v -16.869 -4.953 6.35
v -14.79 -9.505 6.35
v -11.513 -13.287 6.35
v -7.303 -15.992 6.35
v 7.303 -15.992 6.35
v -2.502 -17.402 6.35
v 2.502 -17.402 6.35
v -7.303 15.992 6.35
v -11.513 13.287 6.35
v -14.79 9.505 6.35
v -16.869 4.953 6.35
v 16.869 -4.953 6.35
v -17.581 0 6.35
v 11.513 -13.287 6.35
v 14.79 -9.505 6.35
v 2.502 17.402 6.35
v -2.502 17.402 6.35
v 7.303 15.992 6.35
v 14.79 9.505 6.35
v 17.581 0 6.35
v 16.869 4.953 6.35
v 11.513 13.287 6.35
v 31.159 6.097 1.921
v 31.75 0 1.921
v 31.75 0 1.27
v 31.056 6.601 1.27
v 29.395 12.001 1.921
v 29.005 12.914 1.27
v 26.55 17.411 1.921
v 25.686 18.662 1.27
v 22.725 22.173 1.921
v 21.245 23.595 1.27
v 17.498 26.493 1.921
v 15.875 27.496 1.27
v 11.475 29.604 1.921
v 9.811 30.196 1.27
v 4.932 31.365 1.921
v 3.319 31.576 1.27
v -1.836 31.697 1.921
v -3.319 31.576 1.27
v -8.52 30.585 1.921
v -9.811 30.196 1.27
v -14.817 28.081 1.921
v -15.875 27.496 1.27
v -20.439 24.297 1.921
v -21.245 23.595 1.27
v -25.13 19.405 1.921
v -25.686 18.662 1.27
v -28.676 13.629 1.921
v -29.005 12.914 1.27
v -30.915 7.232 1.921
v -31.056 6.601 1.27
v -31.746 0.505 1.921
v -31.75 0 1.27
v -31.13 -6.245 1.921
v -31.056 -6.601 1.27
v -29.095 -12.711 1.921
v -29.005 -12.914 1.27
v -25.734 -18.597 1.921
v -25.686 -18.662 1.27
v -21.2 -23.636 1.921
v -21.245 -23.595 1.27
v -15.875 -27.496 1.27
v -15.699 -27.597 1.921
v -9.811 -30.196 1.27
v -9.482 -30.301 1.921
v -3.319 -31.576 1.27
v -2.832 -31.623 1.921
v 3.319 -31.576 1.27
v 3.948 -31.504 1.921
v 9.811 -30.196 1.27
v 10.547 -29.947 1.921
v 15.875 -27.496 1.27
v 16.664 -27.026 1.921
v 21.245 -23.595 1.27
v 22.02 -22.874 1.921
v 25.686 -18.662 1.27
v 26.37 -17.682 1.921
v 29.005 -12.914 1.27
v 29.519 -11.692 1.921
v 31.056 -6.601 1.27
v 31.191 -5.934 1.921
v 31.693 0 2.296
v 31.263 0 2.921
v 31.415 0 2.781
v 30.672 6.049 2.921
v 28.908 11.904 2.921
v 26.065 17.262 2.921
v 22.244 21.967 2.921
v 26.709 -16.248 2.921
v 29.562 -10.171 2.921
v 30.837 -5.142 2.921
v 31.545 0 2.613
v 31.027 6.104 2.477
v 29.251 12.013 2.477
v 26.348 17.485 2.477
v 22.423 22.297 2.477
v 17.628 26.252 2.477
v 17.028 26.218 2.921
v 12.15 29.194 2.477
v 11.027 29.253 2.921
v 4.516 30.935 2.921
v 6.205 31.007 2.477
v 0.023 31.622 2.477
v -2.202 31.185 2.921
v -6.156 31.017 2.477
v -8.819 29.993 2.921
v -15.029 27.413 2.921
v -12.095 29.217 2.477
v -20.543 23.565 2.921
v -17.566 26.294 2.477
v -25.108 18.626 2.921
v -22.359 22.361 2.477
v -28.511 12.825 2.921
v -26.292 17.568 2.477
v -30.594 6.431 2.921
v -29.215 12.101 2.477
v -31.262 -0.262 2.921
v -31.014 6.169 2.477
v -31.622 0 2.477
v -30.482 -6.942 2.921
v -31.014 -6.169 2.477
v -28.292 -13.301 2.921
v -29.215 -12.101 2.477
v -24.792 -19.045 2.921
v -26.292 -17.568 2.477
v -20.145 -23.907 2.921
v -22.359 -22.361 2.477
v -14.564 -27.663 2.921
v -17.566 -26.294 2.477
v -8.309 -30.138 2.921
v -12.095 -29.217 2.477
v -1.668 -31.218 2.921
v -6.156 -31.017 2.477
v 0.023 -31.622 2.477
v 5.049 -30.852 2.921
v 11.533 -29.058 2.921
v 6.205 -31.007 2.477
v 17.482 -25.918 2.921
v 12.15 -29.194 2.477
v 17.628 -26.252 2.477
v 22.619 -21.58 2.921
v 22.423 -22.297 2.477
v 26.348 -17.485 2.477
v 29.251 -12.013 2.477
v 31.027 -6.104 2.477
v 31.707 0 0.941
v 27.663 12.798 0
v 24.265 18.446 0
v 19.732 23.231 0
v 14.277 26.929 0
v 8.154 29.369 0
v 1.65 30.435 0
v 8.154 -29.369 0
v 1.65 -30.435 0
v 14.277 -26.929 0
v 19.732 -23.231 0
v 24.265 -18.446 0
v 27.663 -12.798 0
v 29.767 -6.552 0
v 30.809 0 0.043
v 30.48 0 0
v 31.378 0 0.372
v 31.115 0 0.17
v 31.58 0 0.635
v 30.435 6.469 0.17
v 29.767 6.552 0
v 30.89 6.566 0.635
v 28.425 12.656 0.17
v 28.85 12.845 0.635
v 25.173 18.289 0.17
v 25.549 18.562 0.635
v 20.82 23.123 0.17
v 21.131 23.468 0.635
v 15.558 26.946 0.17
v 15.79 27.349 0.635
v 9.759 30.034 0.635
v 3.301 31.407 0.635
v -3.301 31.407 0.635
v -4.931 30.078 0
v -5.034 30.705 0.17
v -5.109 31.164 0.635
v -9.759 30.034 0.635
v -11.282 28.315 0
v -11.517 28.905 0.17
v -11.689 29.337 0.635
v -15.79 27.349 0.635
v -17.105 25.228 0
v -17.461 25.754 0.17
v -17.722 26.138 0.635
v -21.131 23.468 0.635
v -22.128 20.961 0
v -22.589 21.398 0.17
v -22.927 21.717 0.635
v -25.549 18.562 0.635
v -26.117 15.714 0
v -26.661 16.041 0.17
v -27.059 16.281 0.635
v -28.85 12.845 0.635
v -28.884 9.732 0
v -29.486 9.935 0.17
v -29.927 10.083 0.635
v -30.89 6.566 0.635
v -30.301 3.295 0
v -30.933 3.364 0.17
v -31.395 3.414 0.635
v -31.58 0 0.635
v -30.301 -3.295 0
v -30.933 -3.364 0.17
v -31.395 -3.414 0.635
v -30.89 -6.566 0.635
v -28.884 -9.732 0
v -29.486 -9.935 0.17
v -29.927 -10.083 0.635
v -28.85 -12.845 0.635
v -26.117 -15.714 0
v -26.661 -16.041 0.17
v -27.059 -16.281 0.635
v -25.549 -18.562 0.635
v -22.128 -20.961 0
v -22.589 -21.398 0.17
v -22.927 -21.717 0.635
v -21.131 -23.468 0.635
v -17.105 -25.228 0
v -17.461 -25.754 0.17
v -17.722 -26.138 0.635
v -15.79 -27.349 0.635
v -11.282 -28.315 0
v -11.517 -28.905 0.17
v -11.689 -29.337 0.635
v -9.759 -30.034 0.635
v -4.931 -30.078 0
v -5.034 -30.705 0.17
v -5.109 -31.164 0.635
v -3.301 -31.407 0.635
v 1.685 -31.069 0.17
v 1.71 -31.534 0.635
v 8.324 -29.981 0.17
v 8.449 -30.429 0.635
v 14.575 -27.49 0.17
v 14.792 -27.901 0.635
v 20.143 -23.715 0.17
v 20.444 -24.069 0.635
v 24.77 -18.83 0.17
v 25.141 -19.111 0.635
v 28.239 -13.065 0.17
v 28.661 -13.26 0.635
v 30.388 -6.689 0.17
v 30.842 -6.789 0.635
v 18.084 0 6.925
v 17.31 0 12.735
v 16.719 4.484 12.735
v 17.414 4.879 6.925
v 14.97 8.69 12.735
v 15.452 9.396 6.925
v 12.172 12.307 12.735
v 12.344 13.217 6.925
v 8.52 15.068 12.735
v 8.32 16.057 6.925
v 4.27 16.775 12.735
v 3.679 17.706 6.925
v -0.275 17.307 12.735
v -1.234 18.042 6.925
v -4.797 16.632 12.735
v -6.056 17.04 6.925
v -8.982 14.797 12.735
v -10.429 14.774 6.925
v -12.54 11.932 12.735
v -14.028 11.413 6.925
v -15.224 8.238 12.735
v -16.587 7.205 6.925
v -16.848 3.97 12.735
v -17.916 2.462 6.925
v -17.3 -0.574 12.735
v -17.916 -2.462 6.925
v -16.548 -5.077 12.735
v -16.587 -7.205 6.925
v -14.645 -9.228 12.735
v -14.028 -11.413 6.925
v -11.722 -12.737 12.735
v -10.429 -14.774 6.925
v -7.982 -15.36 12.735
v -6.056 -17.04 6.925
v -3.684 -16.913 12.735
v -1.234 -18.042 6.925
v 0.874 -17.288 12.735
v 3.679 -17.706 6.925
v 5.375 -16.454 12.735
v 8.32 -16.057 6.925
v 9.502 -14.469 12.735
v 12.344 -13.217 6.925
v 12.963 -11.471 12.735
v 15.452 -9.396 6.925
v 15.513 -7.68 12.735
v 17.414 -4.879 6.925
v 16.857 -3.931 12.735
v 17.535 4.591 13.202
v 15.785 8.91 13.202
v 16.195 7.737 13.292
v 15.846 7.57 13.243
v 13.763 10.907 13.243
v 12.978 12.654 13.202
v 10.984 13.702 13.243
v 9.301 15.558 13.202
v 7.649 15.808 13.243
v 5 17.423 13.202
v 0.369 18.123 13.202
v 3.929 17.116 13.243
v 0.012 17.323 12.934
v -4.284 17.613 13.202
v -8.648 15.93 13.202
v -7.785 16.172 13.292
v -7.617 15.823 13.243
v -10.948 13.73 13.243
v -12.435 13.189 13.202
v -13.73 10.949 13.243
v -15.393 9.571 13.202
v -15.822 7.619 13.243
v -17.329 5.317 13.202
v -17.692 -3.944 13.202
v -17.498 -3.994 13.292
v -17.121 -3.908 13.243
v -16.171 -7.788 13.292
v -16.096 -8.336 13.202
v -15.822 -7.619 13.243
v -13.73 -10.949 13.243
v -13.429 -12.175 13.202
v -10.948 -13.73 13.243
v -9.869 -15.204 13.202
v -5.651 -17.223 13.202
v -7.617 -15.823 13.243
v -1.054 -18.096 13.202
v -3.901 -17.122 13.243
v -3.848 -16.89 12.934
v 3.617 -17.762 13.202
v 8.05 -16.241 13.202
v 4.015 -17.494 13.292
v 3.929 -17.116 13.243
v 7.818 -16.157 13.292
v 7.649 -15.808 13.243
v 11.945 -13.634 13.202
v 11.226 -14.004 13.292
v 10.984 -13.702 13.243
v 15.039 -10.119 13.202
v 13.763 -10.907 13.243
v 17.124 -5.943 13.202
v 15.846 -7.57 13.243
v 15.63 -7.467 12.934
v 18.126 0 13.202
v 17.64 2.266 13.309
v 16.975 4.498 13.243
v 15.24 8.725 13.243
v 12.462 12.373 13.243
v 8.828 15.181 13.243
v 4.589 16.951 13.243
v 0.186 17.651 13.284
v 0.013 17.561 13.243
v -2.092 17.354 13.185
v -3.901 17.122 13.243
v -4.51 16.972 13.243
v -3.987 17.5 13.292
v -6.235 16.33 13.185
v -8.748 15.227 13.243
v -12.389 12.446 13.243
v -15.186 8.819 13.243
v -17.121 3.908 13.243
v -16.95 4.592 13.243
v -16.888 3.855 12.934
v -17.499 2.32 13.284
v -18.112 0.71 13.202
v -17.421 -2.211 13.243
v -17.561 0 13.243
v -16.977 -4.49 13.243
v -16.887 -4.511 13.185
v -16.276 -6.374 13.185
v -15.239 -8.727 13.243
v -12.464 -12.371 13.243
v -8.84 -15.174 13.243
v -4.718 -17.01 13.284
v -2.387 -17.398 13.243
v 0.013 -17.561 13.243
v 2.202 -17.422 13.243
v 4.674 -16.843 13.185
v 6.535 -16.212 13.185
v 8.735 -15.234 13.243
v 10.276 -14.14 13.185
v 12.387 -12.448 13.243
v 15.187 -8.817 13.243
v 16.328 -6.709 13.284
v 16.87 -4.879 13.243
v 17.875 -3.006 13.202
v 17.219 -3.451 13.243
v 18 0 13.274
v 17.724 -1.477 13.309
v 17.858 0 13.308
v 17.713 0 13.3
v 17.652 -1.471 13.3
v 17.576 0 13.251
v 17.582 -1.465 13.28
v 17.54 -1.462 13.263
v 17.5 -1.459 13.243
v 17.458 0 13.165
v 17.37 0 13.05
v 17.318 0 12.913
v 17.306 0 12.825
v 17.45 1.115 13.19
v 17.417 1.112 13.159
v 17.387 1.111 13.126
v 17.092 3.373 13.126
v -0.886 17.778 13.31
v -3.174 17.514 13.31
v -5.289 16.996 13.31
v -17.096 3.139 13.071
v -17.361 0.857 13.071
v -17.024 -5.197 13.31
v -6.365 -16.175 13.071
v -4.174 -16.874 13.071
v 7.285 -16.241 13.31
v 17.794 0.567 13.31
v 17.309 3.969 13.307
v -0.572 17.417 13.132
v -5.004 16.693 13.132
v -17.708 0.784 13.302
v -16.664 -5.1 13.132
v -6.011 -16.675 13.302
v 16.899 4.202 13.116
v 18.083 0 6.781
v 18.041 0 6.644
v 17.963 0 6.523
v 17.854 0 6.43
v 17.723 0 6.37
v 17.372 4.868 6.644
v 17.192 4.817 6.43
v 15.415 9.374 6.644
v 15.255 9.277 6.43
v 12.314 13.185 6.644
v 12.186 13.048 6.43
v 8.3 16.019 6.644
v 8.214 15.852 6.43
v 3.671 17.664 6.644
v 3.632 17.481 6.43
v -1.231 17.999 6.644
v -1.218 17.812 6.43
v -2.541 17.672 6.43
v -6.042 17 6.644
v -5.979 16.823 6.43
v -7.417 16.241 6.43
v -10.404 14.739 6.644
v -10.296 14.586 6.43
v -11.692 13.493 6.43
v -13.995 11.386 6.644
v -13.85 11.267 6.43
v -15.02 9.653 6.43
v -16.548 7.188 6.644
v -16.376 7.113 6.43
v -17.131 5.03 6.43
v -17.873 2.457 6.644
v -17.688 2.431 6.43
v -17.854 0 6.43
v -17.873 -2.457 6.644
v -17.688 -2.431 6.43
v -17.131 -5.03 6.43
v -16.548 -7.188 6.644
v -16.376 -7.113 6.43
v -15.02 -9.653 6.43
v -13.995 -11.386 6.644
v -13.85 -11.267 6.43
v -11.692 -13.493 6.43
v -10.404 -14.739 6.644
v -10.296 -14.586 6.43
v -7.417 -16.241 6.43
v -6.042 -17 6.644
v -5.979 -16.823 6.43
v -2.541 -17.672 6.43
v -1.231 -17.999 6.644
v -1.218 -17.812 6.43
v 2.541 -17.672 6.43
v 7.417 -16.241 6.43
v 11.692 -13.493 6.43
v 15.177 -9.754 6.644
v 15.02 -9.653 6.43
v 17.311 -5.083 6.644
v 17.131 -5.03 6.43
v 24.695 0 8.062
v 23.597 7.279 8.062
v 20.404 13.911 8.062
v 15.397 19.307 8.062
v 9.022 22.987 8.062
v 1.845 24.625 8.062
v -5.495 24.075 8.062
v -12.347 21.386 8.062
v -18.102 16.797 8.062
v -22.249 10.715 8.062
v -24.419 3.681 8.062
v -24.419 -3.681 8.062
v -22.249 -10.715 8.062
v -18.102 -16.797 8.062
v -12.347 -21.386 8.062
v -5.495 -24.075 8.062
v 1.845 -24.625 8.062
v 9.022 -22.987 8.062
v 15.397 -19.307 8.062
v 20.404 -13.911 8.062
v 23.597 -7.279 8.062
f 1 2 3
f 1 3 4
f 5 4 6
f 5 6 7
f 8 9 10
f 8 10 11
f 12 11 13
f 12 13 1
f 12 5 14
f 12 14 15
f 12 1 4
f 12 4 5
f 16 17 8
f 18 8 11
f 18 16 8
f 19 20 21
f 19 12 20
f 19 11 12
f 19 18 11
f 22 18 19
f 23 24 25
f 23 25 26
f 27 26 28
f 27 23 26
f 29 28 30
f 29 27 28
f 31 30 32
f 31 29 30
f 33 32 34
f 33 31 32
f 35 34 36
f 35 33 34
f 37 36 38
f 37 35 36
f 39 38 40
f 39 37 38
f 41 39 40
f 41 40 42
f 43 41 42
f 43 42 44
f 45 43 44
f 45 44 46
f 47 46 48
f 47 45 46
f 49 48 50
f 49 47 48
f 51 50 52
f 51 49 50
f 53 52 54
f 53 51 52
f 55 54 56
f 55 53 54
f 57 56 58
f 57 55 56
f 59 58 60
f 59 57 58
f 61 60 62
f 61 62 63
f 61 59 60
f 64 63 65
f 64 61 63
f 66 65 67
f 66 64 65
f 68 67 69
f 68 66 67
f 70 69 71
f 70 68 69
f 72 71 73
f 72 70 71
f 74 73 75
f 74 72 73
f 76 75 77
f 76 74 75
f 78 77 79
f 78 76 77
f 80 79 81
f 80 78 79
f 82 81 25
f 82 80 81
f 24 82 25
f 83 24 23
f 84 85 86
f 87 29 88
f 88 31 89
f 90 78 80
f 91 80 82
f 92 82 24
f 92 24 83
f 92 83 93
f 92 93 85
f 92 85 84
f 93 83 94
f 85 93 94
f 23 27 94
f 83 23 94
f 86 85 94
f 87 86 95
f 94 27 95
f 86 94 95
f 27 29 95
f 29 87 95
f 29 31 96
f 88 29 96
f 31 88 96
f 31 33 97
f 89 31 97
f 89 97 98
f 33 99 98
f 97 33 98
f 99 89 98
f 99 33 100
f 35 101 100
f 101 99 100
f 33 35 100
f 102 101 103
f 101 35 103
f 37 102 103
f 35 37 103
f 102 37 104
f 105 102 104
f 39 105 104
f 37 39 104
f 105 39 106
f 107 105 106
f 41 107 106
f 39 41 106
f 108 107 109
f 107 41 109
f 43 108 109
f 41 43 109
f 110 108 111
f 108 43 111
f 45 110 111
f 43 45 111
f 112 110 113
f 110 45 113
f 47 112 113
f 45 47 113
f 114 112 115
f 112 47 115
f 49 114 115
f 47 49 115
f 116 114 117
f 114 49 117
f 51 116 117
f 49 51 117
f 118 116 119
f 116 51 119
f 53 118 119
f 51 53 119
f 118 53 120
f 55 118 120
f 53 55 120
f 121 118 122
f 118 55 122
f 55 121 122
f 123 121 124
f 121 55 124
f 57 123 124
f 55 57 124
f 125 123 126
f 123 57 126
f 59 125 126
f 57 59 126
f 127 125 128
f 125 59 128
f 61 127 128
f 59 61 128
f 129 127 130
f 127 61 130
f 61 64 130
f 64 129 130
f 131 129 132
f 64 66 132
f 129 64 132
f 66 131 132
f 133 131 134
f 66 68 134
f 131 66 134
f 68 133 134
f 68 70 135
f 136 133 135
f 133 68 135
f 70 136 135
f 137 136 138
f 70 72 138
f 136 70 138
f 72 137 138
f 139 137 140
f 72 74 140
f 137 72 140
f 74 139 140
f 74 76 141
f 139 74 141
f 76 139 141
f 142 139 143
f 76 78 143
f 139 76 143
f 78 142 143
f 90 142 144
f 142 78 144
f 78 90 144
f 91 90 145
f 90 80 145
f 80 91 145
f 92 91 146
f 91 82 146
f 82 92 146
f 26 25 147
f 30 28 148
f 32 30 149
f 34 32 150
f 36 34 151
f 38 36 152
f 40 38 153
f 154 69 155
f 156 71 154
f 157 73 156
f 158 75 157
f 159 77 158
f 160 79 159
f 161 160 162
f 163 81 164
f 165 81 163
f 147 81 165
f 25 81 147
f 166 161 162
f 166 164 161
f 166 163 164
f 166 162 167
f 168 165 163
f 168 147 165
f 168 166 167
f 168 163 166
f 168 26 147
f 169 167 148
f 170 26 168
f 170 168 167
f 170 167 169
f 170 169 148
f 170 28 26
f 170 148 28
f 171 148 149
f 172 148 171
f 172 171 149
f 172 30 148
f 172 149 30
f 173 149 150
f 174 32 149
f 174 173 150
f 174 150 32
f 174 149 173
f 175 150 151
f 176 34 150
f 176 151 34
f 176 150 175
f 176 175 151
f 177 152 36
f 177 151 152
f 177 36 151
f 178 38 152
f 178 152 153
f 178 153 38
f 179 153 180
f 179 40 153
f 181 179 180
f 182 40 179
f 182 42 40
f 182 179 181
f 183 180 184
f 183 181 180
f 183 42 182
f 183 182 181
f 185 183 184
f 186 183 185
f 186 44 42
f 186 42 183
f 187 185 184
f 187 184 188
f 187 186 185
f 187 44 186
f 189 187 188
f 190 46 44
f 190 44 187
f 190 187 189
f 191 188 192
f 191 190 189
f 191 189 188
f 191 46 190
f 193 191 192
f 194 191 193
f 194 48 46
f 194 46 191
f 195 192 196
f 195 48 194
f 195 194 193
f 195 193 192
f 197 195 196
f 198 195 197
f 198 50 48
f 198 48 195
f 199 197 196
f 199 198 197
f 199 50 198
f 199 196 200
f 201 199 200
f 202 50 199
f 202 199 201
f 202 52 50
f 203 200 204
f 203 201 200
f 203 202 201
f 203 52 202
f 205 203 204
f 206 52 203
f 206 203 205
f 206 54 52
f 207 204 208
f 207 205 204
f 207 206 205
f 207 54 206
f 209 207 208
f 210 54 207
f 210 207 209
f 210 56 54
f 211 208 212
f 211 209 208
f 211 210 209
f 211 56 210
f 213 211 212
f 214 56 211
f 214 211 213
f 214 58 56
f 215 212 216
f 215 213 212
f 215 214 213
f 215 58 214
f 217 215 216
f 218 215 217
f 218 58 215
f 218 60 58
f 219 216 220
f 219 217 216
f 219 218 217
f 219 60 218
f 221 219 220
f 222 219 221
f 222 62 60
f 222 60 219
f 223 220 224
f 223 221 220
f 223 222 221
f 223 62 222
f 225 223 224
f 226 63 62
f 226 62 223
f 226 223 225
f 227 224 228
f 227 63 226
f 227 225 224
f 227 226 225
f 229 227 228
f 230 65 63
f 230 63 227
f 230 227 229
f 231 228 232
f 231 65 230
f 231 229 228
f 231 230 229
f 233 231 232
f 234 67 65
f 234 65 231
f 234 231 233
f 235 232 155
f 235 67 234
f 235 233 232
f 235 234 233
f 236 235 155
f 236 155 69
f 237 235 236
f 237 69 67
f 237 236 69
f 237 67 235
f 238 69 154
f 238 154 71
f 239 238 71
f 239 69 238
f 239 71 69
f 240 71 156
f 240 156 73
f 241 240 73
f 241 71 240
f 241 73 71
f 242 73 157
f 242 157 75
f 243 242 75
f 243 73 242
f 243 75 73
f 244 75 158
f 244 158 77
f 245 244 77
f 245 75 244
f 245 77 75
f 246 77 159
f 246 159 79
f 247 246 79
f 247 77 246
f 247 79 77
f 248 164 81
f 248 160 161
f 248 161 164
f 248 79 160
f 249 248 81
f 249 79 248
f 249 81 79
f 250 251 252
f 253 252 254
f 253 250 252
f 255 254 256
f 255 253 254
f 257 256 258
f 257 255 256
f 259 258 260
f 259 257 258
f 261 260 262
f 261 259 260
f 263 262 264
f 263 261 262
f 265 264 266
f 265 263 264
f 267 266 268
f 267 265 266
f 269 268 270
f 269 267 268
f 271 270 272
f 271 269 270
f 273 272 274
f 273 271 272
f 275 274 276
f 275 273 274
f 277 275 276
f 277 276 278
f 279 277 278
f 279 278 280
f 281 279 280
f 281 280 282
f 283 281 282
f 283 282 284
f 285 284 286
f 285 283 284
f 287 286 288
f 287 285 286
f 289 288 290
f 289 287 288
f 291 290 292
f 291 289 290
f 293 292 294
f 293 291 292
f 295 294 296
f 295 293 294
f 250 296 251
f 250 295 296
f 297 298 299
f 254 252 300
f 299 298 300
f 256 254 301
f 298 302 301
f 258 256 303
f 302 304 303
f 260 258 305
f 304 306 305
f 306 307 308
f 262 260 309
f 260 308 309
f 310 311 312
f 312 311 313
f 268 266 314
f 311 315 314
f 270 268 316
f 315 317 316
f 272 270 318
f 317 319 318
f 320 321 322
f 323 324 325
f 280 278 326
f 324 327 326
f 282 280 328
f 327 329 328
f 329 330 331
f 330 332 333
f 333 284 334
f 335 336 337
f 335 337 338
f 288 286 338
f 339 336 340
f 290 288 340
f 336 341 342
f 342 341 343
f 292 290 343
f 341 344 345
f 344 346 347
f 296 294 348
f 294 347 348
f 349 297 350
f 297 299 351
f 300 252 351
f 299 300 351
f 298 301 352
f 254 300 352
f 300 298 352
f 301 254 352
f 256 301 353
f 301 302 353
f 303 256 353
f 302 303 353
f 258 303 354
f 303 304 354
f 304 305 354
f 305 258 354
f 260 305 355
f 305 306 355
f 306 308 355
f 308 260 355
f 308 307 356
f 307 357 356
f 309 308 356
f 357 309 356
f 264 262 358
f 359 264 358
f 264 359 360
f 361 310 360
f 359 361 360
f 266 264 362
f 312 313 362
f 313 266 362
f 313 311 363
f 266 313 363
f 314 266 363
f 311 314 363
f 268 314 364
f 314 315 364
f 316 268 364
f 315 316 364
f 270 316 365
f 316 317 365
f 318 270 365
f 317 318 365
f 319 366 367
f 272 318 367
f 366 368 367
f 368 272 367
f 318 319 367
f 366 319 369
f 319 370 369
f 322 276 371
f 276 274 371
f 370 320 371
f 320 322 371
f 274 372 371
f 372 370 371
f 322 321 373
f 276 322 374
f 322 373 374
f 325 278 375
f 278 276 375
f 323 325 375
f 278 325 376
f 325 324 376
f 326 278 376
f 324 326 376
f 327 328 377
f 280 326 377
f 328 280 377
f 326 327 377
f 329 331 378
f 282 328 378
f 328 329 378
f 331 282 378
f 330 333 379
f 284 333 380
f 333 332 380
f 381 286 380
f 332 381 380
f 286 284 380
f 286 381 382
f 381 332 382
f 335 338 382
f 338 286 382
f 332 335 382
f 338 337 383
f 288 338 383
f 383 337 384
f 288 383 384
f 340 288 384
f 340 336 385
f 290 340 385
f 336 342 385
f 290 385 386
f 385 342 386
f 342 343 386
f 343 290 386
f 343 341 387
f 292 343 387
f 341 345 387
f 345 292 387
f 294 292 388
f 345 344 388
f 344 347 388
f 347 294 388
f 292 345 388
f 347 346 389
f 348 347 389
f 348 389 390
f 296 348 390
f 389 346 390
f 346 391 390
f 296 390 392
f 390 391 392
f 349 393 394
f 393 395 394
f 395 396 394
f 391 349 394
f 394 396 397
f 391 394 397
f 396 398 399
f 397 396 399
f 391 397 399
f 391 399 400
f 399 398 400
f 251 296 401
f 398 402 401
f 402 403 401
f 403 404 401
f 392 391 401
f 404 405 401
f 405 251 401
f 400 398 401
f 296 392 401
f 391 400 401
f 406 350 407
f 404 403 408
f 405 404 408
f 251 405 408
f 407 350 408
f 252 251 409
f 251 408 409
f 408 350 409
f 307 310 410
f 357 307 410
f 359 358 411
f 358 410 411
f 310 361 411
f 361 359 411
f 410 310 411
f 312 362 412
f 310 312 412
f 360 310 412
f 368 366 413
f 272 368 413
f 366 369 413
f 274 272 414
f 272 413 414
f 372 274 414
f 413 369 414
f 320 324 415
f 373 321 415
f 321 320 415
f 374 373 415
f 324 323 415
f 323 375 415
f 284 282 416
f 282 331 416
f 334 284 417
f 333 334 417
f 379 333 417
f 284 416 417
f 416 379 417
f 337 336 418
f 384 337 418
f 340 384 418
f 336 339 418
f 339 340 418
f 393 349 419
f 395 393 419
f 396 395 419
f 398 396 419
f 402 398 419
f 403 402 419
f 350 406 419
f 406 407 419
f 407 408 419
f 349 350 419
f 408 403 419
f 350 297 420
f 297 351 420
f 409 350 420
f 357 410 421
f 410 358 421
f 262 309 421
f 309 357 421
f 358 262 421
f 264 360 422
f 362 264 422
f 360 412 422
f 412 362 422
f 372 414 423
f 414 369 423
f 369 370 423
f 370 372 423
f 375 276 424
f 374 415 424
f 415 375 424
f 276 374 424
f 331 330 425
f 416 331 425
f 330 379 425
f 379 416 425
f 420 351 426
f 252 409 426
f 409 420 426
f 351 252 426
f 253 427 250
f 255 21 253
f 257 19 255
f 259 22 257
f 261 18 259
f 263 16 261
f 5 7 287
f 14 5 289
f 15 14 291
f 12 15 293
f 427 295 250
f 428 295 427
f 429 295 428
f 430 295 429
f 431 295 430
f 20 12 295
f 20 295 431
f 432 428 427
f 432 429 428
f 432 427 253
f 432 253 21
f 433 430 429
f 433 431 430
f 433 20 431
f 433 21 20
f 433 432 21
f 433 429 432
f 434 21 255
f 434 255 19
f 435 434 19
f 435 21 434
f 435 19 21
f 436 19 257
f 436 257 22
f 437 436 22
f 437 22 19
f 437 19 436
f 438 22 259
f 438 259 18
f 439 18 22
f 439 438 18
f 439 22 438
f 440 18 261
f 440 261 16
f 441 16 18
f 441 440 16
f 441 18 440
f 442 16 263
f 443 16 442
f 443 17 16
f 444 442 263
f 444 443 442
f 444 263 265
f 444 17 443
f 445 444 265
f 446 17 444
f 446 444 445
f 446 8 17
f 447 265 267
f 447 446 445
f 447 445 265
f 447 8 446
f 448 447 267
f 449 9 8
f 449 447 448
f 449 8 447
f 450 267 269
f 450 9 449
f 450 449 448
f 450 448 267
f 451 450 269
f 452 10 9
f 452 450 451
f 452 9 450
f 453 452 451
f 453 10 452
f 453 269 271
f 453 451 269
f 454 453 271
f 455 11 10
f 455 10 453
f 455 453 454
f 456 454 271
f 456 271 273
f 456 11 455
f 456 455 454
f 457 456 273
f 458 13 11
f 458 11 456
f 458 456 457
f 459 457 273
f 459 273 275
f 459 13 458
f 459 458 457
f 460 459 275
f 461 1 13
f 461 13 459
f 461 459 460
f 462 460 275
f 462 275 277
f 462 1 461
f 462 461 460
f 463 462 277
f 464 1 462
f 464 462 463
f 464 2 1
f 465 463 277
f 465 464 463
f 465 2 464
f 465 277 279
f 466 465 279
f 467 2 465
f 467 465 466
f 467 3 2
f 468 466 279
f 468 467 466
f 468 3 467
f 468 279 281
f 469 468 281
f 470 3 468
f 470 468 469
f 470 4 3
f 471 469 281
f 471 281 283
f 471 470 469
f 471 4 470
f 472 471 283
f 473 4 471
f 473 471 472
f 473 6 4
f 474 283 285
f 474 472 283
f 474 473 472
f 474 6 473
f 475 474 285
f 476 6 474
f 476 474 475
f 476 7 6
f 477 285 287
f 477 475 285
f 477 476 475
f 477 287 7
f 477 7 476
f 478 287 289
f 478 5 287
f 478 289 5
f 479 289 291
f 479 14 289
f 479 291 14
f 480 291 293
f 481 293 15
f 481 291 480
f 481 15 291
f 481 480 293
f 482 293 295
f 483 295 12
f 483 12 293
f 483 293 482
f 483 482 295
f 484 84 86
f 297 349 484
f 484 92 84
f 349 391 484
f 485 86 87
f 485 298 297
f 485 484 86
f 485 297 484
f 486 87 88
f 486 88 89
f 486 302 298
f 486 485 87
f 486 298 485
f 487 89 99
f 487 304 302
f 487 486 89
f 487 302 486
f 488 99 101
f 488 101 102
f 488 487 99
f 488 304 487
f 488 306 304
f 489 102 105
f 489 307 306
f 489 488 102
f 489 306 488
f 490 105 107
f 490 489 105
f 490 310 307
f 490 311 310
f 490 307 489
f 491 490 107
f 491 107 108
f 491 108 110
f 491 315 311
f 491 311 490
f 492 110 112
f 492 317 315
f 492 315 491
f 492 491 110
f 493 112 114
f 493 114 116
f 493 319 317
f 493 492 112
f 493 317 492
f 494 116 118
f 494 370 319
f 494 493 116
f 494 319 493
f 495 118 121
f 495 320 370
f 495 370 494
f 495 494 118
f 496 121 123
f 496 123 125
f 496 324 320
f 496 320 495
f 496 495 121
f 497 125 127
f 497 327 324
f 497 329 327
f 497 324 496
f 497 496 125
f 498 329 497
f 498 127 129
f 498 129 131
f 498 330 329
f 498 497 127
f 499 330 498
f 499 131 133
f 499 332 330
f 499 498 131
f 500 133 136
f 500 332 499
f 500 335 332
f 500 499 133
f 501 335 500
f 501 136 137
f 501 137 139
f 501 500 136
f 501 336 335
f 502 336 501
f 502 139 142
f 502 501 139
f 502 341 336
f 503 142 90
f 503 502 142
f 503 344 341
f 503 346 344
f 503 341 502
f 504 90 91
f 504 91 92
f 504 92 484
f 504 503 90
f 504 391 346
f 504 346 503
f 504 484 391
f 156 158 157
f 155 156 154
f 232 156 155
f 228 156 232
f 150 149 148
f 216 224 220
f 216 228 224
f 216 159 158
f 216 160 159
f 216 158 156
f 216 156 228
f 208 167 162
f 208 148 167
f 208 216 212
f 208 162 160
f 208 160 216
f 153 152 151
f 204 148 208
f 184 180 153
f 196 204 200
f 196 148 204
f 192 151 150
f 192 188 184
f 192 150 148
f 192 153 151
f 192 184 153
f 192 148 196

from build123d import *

# Parameters (mm, degrees)
F2_R = 1.27
F3_R = 0.508


with BuildPart() as f1:
    # F0 (on Front) → F1 (revolve)
    with BuildSketch(Plane.XZ):
        Polygon((0, 6.35), (0, 0), (31.75, 0), (31.75, 2.54), (17.145, 13.97), (18.161, 6.35), align=None)
    revolve(axis=Axis((0, 0, 24.993432), (0, 0, 1)))

    # F2
    f2_edges = [f1.edges().sort_by_distance(p)[0] for p in [
        (-31.75, 0, 0),
        (-31.75, 0, 2.54),
        (31.75, 0, 1.27),
    ]]
    fillet(f2_edges, radius=F2_R)

    # F3
    f3_edges = [f1.edges().sort_by_distance(p)[0] for p in [
        (-17.145, 0, 13.97),
        (-18.161, 0, 6.35),
        (17.653, 0, 10.16),
    ]]
    fillet(f3_edges, radius=F3_R)


solid = f1.part
